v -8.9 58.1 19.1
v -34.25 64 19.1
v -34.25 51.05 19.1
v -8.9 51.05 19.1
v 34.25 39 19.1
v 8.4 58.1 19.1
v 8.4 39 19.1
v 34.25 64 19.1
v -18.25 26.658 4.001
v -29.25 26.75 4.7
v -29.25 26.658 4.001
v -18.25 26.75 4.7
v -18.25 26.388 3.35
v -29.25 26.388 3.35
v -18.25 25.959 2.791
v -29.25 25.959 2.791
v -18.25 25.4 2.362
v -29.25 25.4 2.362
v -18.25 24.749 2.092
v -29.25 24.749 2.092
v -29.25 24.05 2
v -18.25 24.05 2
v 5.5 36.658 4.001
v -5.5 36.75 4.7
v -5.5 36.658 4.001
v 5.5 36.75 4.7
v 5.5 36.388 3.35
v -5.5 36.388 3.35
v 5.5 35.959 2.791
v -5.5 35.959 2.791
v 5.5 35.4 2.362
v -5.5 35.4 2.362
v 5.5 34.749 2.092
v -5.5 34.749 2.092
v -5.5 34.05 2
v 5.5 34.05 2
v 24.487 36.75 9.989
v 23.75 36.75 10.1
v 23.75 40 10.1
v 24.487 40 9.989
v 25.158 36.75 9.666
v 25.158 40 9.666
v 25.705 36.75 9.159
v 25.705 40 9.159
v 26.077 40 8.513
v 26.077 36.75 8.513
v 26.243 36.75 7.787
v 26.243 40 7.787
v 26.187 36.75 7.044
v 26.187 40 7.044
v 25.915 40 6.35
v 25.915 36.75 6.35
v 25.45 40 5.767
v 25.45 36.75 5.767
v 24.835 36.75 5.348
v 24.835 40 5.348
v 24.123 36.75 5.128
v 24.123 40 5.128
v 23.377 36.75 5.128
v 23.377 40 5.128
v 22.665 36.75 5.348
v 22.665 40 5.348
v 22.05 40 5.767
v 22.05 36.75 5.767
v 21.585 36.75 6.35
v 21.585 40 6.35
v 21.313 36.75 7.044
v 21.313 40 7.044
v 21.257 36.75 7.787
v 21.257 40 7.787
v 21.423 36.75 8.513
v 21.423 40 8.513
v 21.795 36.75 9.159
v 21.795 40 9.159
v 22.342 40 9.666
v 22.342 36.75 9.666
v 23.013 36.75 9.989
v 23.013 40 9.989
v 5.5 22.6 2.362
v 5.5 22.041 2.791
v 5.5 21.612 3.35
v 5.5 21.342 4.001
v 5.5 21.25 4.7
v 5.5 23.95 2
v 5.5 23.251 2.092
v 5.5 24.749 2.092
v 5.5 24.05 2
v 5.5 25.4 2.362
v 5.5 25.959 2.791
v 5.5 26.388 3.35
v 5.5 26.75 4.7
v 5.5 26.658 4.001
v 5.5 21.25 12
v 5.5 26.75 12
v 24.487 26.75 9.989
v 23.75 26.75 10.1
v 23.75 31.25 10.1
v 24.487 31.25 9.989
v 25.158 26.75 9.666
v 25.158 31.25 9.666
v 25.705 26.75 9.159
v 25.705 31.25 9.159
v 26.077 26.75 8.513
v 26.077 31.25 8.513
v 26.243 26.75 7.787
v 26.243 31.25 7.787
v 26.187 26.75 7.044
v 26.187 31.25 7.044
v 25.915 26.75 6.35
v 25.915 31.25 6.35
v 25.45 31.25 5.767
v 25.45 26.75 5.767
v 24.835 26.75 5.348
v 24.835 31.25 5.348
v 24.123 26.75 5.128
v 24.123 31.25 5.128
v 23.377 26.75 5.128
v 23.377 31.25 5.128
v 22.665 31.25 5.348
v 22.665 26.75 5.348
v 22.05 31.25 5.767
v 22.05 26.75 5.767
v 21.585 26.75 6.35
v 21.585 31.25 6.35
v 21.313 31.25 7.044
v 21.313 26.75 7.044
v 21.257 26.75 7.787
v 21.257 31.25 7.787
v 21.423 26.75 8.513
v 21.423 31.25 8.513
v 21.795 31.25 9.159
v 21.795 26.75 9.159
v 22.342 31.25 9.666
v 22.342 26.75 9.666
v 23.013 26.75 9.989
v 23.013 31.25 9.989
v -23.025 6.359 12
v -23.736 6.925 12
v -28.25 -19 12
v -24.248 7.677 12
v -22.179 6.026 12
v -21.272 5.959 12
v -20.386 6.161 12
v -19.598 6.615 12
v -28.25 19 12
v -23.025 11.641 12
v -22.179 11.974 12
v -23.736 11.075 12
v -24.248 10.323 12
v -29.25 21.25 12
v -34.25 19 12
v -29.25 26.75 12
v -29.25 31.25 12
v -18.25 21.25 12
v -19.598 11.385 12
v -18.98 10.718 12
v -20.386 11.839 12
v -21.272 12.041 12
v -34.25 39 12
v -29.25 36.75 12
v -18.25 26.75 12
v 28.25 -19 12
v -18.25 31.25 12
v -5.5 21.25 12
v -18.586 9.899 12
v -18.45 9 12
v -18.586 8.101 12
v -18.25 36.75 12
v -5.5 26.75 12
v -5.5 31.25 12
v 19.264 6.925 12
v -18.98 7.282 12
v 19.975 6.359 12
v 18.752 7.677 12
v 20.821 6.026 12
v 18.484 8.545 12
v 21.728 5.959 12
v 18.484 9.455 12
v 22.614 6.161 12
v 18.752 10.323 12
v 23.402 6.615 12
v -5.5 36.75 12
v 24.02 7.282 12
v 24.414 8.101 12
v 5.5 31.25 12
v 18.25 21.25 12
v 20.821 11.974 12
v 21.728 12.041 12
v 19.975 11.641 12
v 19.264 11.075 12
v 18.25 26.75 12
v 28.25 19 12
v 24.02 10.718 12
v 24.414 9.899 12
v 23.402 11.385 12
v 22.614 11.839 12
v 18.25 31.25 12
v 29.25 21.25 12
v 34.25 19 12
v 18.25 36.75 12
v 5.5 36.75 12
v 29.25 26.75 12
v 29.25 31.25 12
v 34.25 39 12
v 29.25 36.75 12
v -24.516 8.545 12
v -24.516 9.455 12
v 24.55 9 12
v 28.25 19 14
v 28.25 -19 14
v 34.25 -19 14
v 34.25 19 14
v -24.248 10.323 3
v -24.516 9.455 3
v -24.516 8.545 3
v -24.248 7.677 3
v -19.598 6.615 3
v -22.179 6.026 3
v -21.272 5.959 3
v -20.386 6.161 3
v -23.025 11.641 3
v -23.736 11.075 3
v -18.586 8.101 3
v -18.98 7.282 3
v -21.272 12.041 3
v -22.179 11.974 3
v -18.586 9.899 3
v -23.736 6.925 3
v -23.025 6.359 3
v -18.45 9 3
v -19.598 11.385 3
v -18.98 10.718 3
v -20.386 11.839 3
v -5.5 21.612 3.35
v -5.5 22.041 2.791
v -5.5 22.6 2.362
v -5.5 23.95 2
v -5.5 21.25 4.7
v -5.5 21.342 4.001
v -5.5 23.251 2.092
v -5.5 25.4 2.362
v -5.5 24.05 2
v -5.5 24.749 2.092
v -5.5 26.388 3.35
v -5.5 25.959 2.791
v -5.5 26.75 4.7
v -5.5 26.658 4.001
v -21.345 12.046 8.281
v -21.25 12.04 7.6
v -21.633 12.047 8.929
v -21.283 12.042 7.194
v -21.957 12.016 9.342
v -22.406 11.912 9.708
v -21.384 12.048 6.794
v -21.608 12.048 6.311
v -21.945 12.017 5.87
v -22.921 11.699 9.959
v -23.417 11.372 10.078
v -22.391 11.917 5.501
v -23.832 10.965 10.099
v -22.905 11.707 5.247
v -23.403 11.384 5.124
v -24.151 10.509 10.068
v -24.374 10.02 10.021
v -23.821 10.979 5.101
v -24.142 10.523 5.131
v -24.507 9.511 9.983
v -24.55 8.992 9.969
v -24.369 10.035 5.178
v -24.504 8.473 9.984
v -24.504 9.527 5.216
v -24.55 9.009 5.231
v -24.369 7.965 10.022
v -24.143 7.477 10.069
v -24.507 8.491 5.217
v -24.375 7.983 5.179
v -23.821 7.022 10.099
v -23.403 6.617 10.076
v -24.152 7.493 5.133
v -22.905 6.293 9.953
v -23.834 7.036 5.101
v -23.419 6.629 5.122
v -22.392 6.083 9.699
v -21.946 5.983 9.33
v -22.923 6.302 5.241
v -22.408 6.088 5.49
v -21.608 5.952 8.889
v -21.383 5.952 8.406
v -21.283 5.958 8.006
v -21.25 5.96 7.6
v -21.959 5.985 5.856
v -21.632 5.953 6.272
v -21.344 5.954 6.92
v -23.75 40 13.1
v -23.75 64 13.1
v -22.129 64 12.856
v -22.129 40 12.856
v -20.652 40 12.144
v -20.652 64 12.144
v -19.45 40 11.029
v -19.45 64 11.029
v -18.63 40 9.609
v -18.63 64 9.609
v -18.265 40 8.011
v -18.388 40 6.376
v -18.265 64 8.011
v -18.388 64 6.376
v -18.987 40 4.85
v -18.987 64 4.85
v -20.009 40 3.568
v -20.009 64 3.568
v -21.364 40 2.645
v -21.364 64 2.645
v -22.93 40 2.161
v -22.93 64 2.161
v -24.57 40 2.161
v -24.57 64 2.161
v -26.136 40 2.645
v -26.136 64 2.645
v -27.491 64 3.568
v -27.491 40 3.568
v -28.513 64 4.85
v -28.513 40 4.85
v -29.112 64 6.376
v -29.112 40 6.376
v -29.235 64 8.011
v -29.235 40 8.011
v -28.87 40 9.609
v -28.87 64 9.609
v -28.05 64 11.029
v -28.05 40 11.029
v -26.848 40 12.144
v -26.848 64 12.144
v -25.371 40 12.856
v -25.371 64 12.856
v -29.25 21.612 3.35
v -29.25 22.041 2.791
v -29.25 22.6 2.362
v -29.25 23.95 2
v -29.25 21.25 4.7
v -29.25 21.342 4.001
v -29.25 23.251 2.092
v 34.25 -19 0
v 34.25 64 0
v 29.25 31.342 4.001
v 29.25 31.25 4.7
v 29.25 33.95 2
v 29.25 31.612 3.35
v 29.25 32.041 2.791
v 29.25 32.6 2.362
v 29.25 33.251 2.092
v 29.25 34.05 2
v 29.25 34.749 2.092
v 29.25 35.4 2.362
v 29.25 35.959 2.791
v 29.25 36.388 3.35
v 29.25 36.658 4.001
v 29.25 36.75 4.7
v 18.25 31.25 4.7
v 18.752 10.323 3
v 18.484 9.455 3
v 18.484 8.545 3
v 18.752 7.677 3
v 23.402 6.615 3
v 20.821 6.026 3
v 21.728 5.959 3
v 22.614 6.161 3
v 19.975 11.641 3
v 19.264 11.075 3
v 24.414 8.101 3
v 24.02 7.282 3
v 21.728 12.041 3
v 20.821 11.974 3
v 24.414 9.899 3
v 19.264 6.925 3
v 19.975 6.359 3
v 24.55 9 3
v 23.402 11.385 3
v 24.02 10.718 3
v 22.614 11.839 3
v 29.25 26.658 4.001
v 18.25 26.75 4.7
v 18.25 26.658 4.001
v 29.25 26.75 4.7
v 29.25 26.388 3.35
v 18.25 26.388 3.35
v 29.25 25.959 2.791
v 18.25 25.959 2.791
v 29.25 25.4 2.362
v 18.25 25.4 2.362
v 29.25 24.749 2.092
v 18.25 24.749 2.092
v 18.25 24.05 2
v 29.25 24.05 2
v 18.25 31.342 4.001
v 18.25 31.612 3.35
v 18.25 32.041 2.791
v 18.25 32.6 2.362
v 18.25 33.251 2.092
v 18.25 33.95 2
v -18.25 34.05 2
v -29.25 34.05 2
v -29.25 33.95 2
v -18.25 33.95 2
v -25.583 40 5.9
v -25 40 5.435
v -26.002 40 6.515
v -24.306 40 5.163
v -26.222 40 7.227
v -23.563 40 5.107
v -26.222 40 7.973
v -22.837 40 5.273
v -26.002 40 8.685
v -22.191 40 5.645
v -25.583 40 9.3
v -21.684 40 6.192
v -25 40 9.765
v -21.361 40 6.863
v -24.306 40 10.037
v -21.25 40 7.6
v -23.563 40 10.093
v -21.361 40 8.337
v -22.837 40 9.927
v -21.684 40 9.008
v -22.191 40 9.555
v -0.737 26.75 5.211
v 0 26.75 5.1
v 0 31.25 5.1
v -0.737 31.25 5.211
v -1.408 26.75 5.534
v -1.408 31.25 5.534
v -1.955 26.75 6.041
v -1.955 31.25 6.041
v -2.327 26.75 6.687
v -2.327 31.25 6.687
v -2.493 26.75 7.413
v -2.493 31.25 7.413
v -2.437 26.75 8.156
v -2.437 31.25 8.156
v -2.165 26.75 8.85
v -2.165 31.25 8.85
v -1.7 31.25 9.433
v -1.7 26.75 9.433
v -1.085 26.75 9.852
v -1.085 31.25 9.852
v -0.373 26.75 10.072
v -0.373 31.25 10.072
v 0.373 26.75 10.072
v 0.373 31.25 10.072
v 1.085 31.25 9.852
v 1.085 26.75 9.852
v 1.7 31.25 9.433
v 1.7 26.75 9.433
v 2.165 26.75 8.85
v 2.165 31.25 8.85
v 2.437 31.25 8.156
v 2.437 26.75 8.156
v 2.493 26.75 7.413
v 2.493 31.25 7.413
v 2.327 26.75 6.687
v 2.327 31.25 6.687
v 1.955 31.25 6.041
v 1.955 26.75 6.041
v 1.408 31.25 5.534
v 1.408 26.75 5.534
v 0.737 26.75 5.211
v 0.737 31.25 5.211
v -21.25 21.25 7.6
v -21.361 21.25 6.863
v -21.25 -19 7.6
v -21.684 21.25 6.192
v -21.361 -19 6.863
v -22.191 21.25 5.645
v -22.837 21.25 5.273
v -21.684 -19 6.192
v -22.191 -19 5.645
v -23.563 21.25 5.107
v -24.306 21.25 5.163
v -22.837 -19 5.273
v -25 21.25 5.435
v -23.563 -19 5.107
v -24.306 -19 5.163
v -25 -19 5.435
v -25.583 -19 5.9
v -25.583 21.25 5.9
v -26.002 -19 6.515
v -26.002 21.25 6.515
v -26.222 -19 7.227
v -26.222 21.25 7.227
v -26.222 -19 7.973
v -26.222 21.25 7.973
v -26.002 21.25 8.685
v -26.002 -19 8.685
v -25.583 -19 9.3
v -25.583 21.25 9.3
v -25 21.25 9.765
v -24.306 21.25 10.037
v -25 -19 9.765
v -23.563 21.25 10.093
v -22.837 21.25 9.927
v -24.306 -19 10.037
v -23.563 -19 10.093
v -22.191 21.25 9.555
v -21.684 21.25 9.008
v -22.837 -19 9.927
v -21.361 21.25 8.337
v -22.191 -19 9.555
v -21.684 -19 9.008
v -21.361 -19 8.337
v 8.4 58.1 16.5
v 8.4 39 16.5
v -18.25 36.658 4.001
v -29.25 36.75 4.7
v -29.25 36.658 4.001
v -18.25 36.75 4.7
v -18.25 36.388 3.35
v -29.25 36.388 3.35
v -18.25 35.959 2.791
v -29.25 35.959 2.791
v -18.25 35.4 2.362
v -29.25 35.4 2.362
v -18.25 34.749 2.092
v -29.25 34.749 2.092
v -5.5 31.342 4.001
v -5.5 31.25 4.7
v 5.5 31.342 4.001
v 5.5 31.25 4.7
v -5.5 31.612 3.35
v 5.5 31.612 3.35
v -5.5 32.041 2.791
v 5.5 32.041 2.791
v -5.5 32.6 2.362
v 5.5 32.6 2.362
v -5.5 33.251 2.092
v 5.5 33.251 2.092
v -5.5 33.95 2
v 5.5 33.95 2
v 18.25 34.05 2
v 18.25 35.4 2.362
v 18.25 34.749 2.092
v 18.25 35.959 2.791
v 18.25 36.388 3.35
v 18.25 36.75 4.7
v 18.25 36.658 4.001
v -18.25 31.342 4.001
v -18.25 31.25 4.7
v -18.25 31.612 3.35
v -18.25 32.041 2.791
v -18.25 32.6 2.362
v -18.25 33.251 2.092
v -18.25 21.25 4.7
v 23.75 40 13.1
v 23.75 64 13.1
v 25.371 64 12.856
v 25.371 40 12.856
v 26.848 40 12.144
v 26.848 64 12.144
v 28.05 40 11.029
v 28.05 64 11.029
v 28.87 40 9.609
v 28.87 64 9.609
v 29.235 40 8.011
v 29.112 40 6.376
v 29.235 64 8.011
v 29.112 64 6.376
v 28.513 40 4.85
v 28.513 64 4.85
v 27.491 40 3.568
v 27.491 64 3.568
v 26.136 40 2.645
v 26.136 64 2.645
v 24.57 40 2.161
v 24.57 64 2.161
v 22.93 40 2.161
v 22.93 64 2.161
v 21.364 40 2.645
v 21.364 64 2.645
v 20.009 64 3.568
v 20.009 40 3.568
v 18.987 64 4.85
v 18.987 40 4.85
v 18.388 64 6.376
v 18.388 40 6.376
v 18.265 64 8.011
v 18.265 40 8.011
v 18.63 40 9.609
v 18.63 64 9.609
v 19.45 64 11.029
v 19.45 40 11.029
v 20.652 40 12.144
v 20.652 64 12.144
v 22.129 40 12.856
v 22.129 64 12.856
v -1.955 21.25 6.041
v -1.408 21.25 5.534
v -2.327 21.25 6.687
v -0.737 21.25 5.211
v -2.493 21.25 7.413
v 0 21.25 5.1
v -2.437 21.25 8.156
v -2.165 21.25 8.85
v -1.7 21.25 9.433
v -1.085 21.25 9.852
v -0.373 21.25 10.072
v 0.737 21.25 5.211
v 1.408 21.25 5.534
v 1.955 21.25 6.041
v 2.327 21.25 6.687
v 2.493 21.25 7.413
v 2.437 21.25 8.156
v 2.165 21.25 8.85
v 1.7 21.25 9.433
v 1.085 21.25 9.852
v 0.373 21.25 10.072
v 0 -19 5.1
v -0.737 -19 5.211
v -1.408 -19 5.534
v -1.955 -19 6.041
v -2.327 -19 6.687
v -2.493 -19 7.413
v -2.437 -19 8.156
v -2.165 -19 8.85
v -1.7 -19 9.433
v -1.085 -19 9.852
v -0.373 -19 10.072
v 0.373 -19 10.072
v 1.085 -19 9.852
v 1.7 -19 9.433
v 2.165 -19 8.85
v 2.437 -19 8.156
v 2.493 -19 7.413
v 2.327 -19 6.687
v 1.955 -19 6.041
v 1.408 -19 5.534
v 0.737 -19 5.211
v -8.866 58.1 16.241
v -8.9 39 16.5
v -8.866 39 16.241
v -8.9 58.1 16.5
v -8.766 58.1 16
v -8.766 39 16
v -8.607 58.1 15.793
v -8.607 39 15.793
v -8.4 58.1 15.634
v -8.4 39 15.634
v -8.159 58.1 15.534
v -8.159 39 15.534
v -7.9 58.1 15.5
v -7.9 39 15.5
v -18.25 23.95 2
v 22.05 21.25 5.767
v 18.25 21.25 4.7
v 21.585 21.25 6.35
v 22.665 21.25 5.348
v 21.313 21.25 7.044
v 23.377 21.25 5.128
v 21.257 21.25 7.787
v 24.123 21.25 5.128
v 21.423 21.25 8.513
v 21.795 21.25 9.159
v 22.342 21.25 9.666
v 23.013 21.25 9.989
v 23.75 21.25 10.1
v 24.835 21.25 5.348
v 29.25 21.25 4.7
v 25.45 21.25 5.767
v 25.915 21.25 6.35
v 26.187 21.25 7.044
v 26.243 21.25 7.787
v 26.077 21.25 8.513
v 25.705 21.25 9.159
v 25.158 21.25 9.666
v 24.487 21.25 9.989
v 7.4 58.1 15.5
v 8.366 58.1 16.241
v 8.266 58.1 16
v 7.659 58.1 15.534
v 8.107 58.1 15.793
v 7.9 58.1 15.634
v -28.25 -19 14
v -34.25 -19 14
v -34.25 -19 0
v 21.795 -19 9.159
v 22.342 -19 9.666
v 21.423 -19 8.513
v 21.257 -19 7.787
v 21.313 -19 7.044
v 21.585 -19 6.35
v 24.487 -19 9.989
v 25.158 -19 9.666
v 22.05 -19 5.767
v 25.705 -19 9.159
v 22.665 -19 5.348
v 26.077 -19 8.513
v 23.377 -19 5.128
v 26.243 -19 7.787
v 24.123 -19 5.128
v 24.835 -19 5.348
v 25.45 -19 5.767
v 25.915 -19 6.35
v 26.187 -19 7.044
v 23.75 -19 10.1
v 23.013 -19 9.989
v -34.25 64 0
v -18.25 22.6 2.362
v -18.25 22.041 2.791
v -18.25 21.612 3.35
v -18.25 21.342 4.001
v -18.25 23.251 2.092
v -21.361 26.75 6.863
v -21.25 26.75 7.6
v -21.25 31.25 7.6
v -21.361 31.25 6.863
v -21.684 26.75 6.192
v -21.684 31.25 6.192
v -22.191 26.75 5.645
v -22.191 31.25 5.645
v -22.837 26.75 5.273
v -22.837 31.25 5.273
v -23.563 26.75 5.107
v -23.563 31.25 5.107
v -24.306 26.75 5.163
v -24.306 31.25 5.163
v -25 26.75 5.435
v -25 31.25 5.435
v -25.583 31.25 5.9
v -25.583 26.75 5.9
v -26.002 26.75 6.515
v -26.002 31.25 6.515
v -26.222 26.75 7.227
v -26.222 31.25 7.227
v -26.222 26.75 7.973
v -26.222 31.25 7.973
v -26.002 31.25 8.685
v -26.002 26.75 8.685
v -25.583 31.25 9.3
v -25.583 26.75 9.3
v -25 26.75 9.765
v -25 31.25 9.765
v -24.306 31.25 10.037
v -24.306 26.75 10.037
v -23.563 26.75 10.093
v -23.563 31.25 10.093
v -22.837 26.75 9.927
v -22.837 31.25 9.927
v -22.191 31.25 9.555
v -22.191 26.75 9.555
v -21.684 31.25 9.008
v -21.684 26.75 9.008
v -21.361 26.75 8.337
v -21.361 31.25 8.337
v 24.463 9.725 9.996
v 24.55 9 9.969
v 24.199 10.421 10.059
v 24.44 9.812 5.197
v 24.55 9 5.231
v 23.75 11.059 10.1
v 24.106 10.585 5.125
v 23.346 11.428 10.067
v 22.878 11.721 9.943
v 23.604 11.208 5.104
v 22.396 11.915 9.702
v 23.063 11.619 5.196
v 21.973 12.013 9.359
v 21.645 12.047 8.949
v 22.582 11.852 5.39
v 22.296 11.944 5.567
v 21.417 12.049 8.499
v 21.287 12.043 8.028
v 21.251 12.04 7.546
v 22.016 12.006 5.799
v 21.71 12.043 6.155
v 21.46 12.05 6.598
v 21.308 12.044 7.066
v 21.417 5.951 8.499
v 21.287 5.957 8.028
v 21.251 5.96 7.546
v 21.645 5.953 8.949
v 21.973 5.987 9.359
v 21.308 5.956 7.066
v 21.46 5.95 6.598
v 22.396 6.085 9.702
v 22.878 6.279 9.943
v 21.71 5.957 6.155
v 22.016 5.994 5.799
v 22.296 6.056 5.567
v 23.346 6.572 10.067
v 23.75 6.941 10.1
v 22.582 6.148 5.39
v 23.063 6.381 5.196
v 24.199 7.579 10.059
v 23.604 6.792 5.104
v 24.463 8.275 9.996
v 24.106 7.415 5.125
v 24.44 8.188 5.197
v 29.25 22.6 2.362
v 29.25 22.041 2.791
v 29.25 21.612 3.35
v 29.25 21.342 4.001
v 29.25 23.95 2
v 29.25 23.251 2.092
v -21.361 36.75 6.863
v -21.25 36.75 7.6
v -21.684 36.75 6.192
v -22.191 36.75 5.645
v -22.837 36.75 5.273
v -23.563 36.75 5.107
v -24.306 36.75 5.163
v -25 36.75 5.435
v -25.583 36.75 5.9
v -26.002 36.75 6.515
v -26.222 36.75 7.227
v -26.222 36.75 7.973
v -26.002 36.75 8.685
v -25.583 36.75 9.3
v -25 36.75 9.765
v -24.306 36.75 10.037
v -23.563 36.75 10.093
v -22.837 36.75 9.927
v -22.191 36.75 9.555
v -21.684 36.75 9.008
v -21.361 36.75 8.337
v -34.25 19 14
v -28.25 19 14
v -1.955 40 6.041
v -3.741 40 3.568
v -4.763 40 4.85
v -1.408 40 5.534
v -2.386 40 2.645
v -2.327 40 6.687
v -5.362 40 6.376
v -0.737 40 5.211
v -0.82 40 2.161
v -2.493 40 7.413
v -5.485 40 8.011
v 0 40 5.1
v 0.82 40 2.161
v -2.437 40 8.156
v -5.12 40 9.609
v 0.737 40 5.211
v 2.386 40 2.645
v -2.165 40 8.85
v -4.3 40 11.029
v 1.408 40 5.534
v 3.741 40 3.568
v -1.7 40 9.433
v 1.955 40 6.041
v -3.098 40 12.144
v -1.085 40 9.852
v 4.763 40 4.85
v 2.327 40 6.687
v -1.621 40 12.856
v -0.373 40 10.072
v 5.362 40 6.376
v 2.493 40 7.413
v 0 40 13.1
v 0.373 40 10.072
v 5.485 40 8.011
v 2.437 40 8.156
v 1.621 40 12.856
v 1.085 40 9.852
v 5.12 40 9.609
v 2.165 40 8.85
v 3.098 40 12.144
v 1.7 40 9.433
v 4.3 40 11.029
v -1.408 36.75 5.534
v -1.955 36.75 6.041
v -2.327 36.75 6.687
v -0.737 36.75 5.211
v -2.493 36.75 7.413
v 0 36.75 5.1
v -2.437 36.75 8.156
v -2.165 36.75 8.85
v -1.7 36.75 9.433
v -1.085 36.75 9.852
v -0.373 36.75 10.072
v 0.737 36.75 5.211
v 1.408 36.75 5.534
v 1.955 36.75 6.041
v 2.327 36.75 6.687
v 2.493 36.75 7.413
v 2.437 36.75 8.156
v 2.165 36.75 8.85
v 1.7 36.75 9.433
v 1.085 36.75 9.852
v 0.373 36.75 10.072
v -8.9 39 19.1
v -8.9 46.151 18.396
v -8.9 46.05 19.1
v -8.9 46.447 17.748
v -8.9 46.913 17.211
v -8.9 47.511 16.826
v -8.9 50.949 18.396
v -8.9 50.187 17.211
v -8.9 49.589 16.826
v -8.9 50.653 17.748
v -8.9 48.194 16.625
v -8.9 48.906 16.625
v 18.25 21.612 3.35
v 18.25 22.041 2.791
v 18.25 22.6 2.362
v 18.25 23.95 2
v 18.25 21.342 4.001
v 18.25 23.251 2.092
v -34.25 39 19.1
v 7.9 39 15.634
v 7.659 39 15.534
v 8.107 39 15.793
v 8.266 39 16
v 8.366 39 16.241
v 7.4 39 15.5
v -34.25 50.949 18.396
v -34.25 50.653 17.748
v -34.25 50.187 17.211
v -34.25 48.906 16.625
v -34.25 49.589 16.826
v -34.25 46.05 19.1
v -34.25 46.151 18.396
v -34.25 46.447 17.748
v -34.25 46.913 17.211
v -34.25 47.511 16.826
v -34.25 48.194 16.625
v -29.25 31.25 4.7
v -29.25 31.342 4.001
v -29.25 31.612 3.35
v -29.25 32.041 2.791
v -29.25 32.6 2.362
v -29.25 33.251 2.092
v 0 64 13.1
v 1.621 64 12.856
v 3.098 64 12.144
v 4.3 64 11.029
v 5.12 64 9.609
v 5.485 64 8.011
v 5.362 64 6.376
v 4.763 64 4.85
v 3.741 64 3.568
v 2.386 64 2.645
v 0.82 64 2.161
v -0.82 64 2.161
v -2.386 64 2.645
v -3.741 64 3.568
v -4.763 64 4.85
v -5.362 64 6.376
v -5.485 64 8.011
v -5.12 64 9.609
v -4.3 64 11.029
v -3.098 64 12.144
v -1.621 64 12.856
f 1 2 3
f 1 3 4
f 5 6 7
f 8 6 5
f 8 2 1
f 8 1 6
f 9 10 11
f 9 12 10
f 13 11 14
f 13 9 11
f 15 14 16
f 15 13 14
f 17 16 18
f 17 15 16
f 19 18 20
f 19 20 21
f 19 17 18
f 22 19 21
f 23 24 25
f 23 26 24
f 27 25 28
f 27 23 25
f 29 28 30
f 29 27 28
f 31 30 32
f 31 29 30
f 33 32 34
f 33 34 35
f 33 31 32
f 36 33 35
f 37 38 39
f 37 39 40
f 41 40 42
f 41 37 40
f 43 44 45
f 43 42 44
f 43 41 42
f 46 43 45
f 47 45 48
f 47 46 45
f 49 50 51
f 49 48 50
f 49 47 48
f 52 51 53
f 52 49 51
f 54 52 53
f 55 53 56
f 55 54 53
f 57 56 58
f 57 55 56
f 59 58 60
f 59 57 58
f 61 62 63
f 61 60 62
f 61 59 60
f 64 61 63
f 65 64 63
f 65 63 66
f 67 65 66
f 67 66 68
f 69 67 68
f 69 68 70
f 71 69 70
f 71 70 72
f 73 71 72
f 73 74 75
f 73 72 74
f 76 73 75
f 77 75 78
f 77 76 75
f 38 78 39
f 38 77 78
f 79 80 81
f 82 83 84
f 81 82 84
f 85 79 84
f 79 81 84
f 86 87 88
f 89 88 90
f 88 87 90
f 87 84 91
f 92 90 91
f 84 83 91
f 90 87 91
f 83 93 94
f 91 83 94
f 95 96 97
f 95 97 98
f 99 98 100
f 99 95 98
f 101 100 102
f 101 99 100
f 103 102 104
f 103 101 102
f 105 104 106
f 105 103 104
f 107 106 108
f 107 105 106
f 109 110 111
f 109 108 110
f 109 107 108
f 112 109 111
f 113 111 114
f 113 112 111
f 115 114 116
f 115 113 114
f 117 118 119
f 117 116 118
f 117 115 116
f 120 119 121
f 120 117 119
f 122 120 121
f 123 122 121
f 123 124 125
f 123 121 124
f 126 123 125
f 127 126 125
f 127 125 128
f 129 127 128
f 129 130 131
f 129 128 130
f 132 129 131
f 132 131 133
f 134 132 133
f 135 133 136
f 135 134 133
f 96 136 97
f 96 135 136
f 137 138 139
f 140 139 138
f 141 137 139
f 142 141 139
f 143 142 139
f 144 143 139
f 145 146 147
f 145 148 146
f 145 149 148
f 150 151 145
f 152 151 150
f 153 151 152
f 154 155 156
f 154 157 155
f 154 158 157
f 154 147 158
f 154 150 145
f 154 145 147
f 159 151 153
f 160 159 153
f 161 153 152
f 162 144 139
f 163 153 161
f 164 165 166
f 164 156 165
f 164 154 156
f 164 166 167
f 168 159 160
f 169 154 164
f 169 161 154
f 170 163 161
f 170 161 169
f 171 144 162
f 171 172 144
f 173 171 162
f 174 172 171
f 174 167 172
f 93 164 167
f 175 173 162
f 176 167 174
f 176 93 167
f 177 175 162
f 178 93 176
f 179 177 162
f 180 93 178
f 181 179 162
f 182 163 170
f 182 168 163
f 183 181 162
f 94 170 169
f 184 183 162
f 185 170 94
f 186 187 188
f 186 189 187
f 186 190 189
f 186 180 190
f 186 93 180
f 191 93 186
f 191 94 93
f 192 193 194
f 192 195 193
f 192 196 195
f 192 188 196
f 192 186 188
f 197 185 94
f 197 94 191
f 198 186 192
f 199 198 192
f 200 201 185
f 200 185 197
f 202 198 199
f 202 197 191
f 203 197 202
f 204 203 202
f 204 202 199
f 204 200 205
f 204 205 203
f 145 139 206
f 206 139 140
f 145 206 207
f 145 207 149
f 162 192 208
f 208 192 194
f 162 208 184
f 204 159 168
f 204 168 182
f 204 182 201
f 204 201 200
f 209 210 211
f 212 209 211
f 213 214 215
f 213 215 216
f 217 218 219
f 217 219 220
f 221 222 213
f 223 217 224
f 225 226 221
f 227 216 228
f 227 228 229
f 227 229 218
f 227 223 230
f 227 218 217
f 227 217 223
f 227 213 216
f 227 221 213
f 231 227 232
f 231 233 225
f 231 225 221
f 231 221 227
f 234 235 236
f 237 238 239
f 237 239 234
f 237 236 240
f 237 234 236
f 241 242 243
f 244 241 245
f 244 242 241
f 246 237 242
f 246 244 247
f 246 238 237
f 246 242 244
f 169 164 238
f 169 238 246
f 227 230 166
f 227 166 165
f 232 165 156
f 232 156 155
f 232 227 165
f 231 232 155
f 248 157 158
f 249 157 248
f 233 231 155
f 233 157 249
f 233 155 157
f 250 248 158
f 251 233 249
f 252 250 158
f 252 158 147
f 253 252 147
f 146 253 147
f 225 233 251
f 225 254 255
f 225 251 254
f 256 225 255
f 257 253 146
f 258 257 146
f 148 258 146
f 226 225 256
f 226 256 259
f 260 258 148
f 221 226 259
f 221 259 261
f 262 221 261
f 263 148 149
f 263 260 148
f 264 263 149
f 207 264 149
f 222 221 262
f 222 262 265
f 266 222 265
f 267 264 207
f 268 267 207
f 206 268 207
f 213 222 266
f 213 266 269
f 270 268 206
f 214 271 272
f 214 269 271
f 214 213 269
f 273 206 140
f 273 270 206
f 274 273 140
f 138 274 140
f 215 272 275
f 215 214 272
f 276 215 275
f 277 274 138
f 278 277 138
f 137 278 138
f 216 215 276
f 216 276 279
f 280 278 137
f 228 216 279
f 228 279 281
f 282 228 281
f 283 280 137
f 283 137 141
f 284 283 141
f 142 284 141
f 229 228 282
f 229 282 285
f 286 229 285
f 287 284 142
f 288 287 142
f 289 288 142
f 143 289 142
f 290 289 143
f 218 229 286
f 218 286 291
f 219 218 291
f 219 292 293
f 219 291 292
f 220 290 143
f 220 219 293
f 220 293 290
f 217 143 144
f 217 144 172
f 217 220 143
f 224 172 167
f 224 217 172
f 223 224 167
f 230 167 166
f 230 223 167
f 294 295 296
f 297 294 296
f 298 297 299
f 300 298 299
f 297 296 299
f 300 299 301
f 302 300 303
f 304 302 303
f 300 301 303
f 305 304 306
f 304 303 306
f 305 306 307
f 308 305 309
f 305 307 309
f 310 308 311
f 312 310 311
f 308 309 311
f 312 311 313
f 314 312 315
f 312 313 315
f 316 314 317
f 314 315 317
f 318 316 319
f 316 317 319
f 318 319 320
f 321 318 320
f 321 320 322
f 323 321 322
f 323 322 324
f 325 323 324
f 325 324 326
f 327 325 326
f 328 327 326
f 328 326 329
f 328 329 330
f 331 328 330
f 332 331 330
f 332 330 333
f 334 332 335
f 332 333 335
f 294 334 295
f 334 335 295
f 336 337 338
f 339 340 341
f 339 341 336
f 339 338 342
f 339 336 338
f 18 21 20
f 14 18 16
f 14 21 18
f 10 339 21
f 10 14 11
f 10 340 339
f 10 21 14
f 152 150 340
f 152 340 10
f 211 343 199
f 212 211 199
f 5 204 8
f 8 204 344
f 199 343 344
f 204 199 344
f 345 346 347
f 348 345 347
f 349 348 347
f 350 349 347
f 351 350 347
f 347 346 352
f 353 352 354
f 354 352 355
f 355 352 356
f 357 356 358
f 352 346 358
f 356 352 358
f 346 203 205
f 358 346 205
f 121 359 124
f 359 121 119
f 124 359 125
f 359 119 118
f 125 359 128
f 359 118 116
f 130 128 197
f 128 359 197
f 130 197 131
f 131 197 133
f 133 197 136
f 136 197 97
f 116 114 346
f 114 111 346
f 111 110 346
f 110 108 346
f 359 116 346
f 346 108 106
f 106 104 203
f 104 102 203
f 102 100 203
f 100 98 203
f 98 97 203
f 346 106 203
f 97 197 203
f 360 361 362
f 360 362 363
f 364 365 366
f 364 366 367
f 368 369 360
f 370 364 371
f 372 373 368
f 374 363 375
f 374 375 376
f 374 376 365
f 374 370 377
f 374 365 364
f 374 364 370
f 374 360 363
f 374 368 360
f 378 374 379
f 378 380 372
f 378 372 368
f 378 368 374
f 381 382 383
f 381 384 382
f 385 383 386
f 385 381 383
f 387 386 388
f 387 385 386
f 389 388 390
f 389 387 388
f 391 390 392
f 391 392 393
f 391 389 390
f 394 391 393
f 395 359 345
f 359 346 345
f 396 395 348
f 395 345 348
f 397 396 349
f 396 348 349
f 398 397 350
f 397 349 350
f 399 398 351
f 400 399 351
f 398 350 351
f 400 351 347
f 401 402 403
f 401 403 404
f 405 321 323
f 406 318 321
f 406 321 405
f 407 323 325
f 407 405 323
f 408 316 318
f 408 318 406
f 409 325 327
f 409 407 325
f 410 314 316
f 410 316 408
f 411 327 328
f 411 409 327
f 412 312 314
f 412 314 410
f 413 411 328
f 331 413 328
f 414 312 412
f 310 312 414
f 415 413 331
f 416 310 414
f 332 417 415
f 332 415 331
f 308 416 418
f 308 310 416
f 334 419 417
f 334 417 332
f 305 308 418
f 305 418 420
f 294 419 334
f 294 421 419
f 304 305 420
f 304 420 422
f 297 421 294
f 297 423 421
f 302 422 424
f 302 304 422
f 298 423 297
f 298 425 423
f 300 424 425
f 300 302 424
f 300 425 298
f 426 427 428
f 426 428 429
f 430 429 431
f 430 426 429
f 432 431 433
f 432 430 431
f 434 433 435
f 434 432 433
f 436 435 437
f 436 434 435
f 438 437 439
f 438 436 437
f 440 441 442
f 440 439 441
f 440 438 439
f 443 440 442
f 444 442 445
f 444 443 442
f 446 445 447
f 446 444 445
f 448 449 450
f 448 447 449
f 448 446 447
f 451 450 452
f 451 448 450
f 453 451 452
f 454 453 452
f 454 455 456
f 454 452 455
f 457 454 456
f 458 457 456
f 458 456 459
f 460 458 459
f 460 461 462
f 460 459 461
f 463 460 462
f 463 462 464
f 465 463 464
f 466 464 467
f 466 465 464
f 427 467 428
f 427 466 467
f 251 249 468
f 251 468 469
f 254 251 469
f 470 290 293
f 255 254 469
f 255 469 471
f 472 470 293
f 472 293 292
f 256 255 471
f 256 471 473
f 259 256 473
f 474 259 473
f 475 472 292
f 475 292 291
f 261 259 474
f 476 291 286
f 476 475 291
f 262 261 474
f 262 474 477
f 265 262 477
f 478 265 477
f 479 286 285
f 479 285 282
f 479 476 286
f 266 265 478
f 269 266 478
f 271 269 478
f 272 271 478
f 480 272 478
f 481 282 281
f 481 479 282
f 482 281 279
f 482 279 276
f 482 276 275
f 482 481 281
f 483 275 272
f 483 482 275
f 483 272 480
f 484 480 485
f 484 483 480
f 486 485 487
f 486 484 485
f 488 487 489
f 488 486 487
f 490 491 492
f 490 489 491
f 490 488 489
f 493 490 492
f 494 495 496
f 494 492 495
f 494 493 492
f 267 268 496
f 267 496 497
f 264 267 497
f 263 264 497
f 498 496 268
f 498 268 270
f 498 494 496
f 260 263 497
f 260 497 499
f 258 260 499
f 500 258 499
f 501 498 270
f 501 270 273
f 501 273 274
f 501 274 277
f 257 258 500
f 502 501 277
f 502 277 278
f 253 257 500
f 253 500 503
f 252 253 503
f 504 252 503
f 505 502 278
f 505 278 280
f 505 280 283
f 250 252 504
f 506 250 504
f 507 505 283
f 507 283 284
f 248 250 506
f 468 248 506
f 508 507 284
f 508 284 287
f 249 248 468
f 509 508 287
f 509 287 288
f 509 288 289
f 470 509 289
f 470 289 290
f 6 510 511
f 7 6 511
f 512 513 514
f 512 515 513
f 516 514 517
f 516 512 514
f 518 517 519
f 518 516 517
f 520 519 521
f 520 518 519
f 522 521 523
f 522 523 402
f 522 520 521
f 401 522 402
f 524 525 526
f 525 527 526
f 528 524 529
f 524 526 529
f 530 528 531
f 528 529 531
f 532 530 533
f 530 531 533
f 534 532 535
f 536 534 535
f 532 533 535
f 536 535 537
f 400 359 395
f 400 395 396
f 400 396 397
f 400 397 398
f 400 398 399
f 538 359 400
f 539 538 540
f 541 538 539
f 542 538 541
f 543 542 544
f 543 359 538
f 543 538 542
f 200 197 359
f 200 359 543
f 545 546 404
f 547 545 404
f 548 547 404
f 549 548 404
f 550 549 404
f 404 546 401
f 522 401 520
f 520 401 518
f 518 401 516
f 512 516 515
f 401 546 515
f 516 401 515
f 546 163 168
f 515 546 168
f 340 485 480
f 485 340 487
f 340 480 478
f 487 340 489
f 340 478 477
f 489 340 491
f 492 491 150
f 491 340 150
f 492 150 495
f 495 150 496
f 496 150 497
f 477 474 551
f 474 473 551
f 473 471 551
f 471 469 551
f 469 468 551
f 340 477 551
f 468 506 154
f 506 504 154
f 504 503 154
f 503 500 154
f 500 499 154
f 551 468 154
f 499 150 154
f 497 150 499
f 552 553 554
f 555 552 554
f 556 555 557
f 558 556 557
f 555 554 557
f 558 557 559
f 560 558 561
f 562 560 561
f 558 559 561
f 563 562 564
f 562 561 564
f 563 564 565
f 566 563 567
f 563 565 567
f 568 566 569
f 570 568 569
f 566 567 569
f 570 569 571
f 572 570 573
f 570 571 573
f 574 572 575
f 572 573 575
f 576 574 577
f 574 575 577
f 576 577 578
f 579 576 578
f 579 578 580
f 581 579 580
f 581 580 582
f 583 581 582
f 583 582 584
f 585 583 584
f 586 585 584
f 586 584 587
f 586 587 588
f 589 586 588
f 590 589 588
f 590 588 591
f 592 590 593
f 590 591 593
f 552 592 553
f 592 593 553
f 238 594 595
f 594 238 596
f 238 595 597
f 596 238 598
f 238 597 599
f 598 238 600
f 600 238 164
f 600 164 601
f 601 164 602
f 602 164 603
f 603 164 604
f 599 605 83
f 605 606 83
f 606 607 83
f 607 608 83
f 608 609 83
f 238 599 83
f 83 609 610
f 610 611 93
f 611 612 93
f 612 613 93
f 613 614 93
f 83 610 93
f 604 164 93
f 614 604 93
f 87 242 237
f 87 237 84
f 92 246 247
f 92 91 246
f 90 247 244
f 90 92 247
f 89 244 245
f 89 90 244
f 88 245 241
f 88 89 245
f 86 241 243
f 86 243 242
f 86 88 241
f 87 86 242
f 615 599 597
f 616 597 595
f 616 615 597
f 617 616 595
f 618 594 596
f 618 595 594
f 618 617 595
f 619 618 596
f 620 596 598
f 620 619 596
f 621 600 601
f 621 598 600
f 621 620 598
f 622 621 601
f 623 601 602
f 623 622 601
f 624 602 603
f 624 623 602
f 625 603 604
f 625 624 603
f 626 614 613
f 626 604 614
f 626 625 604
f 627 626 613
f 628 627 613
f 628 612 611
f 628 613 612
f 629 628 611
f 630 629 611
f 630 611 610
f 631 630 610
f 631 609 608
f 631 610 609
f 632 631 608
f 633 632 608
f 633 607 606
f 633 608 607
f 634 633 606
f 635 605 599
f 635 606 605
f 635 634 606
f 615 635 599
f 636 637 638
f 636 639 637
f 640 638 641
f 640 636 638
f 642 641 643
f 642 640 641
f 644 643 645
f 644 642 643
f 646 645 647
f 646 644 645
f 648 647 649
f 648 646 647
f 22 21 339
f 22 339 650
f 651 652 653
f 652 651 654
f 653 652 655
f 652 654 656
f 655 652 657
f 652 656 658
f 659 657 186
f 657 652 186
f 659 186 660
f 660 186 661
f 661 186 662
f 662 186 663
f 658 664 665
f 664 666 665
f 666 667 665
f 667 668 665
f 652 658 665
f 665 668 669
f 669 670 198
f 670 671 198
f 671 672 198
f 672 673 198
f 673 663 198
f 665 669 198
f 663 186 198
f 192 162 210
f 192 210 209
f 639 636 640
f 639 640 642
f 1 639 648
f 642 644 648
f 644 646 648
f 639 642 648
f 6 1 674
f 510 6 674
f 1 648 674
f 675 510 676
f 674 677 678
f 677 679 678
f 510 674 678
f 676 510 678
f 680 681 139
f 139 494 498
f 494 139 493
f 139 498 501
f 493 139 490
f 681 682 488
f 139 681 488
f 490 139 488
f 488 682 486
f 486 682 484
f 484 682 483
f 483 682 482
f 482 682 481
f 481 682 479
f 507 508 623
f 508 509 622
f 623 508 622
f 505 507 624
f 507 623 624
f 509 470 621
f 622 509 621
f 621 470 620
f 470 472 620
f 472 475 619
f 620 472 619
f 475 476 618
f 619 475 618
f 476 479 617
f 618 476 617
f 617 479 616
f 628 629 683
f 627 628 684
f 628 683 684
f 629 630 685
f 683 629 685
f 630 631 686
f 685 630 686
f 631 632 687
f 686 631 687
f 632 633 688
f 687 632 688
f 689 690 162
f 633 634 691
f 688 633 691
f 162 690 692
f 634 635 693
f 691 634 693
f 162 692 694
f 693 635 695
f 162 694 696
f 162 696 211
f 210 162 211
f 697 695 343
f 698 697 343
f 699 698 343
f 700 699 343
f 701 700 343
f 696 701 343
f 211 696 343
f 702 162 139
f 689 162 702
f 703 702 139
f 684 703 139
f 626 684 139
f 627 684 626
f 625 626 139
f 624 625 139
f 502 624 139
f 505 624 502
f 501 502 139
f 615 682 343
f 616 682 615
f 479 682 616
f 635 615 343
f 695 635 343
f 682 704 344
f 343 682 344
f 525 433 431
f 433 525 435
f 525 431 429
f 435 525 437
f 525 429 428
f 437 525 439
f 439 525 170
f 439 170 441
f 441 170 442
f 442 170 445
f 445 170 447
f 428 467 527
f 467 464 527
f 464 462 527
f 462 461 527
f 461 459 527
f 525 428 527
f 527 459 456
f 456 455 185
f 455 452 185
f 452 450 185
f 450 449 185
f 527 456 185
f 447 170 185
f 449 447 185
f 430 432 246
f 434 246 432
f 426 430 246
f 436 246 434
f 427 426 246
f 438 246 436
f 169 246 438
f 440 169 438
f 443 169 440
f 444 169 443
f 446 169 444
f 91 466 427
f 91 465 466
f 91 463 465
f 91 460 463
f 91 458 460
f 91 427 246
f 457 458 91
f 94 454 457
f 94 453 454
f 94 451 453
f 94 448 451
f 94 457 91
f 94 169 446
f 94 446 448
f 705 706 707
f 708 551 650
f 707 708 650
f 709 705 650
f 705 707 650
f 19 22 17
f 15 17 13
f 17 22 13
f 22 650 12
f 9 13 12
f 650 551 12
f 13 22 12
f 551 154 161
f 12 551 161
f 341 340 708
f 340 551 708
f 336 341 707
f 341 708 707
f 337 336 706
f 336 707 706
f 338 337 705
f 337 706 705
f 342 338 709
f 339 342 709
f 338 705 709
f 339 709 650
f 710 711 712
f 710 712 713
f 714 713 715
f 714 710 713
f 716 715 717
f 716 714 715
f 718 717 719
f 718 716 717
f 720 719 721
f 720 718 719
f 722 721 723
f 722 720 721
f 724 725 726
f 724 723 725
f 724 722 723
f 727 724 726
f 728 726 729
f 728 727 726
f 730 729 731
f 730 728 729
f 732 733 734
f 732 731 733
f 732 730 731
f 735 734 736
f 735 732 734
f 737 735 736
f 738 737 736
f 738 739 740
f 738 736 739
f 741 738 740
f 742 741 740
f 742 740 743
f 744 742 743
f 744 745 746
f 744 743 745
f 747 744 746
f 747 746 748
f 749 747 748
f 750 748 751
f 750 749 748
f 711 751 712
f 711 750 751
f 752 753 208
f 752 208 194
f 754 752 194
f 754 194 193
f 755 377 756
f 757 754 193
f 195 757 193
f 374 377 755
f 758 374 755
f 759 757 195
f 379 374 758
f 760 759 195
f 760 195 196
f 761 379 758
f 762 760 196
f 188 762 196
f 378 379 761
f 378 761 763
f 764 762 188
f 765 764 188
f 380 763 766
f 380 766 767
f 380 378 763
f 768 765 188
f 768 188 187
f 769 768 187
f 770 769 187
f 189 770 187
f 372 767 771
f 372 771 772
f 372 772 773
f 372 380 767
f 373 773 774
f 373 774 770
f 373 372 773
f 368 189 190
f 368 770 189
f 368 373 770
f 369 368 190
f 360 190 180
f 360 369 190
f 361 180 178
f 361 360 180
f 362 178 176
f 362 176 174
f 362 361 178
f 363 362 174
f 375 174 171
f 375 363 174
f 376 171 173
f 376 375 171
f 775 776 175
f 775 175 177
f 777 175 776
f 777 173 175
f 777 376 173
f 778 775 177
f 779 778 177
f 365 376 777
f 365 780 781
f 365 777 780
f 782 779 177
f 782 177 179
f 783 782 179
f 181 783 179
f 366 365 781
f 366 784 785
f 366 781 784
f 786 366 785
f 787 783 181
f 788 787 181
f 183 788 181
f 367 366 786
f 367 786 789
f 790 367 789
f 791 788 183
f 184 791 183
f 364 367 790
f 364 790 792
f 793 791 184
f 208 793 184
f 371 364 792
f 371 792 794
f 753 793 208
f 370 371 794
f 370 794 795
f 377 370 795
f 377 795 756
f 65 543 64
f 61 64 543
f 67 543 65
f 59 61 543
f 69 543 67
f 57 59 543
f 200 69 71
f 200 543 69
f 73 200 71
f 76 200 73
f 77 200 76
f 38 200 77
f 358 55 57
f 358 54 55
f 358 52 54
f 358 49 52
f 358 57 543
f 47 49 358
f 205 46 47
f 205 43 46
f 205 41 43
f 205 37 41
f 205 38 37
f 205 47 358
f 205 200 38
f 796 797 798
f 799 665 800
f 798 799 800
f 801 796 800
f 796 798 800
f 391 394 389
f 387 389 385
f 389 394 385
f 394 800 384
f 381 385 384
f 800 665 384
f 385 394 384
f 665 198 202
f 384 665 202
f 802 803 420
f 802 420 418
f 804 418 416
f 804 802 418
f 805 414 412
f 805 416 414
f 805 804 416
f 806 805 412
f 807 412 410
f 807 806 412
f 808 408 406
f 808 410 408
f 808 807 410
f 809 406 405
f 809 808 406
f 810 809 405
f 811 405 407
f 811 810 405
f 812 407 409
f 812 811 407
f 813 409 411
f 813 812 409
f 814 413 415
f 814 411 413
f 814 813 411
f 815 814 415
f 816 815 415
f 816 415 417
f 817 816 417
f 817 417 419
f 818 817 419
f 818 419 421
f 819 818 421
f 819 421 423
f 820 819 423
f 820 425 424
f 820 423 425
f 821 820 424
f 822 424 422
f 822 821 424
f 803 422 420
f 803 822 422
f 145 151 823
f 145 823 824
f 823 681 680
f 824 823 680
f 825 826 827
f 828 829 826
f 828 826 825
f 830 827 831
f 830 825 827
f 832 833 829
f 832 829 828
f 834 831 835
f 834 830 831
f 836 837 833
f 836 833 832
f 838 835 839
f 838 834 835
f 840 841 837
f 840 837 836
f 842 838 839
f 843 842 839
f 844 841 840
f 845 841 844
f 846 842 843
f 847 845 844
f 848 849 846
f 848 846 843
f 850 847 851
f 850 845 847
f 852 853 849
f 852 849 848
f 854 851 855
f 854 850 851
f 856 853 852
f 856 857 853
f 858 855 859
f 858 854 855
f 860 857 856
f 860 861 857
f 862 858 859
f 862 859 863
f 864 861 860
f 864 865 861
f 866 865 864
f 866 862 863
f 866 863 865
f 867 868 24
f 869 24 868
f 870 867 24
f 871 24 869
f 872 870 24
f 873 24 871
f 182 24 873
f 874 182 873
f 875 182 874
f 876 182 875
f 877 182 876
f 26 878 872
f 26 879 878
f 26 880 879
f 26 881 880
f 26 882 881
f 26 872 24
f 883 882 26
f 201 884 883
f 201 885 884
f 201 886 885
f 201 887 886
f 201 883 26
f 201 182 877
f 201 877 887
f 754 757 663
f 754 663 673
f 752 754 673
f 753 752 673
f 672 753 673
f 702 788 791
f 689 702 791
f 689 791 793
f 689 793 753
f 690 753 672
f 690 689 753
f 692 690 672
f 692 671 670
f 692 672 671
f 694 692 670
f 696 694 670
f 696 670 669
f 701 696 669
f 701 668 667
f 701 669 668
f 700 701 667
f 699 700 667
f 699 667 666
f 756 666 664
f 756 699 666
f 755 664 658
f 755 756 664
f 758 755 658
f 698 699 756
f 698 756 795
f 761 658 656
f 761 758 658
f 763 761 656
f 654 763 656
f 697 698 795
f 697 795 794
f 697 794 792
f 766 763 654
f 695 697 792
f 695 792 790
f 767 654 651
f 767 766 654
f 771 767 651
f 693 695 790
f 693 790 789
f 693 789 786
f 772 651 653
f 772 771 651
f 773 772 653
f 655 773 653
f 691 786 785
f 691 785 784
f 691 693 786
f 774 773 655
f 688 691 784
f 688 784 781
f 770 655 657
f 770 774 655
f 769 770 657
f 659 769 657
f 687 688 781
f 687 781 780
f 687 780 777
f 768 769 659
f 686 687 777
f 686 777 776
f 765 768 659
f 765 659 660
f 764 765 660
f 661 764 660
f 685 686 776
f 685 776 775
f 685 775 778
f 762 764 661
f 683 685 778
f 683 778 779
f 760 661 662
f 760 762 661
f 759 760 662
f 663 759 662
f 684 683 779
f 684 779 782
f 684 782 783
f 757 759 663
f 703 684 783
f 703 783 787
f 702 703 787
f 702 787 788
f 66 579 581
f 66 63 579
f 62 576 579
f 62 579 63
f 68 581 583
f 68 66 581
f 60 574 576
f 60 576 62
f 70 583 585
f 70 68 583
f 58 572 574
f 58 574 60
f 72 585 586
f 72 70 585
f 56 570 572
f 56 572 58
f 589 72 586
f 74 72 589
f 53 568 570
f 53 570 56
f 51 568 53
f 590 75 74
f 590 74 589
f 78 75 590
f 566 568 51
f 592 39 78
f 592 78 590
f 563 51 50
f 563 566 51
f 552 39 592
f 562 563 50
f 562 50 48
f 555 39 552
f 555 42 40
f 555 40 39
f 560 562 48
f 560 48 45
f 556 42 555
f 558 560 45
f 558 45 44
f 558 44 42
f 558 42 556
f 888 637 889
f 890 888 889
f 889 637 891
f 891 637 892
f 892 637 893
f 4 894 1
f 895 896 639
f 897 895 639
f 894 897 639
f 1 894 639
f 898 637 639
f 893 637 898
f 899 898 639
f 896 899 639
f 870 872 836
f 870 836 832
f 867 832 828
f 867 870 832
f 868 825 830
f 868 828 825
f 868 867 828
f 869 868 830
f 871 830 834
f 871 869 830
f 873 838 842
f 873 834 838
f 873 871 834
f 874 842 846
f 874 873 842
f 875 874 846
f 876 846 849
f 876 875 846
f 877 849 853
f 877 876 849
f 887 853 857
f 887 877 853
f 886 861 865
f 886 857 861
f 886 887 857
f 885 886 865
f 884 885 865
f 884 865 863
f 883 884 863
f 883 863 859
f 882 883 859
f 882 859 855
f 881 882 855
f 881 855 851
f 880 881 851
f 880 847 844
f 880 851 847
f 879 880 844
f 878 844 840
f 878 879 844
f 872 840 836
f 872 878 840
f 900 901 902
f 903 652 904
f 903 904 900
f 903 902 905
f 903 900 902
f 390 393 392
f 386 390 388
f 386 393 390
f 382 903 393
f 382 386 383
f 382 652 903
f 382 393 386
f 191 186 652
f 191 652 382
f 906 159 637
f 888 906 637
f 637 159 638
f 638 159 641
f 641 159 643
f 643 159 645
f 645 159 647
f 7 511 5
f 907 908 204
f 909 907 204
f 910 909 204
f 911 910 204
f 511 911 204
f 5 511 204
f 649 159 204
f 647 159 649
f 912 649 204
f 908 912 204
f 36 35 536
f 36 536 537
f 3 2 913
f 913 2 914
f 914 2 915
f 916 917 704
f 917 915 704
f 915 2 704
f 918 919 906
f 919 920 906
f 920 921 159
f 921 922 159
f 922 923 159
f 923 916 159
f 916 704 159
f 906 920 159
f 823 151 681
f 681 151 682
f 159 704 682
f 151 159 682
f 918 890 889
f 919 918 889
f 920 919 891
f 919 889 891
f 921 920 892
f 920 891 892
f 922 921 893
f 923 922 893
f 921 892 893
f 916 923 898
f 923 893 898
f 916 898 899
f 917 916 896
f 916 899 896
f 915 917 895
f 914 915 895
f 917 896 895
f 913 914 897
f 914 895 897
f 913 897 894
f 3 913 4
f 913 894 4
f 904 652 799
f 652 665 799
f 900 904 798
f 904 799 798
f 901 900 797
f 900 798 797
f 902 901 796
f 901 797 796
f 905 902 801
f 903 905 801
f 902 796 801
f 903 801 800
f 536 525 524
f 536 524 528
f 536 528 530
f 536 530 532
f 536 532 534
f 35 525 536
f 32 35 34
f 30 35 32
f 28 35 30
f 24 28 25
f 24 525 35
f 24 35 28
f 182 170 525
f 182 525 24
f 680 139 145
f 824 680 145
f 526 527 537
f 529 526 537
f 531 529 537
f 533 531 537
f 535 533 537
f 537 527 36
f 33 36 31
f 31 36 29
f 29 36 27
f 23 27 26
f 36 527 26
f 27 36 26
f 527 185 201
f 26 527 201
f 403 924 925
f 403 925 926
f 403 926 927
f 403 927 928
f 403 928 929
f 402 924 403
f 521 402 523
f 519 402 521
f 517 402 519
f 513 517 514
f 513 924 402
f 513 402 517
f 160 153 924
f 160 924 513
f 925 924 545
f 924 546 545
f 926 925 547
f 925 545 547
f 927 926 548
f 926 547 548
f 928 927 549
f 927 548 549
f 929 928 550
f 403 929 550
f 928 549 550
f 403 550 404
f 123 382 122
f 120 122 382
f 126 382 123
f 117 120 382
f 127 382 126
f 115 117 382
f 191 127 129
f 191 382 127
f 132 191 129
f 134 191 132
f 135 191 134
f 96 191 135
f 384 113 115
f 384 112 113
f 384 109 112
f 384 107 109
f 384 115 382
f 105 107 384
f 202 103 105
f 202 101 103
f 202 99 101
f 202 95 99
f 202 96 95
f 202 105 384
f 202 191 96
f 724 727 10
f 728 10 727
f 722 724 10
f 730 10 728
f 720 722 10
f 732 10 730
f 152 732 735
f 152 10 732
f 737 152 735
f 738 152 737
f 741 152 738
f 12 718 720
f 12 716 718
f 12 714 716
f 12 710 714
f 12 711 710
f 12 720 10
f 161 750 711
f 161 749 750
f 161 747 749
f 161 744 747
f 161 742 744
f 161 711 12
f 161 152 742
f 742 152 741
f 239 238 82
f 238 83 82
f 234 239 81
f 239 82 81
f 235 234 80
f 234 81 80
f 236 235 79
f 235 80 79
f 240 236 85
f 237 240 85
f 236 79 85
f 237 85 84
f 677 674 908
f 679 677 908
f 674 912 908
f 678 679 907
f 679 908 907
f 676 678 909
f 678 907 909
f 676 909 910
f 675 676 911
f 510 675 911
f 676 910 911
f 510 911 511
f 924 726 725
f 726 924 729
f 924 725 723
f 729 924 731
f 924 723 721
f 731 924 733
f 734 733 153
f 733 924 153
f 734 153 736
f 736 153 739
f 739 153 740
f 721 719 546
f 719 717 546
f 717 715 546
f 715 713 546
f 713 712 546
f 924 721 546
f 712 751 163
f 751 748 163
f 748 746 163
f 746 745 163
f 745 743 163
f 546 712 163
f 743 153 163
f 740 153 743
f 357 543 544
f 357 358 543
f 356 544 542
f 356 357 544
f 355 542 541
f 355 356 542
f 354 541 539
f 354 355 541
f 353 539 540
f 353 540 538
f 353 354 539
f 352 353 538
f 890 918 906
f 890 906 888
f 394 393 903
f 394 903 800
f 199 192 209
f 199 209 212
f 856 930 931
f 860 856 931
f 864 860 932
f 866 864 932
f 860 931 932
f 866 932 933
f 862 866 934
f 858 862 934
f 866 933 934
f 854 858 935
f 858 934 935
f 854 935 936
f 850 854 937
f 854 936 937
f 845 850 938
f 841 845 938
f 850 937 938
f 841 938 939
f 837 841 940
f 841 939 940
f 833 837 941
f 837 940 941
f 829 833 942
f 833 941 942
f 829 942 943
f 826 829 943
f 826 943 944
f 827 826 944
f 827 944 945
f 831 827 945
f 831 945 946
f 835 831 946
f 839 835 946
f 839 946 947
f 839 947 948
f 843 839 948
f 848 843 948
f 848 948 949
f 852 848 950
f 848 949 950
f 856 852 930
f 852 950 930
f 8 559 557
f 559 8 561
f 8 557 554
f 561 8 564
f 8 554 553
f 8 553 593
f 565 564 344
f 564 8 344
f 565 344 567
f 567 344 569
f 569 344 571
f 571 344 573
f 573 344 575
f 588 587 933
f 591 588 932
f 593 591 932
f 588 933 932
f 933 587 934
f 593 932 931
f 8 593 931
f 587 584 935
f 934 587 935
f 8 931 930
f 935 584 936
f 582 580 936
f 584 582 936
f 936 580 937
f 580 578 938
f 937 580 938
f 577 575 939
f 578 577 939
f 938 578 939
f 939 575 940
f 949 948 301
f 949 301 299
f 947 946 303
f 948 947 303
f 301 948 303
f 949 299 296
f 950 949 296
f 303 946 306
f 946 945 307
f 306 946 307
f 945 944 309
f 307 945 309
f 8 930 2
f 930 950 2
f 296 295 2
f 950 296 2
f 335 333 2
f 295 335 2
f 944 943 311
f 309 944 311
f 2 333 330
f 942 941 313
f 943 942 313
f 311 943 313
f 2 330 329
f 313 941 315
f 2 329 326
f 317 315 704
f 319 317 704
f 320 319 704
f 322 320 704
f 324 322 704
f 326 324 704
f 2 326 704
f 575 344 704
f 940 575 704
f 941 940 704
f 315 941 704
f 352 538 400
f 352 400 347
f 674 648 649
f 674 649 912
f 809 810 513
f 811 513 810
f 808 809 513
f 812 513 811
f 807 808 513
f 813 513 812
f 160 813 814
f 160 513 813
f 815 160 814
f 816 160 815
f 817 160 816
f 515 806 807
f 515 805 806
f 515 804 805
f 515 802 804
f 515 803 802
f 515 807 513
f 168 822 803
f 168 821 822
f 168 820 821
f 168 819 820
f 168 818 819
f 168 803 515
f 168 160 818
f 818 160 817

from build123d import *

# Parameters (mm, degrees)
ESQUISSE2_W                  = 56.5
ESQUISSE2_H                  = 38
ESQUISSE2_R                  = 3.05
ESQUISSE2_W_2                = 6
SOCLESYRINGE_DEPTH           = 12
ESQUISSE2_2_R                = 3.05
BOSS_EXTRU_2_DEPTH           = 3
ESQUISSE2_4_W                = 6
ESQUISSE2_4_H                = 38
BOSS_EXTRU_4_DEPTH           = 14
ESQUISSE3_W                  = 68.5
ESQUISSE3_H                  = 20
BOSS_EXTRU_3_DEPTH           = 12
ESQUISSE4_W                  = 11
ESQUISSE4_H                  = 5.5
ENL_V_MAT_EXTRU_1_DEPTH      = 10
CONG_1_R                     = 2.7
ESQUISSE6_W                  = 68.5
ESQUISSE6_H                  = 25
BOSS_EXTRU_5_DEPTH           = 15.5
BOSS_EXTRU_6_DEPTH           = 3.6
ENL_V_MAT_EXTRU_3_DEPTH      = 80.515611675
CONG_2_R                     = 1
ENL_V_MAT_EXTRU_2_DEPTH      = 76.059126694
ENL_V_MAT_EXTRU_2_DEPTH_BACK = 76.059126694
ESQUISSE5_R                  = 2.5
ESQUISSE9_R                  = 5.5
ENL_V_MAT_EXTRU_4_DEPTH      = 24


with BuildPart() as part:
    # Esquisse2 → SocleSyringe (new body)
    # profile 1 of 3: a face of its own
    with BuildSketch(Plane.XY):
        Rectangle(ESQUISSE2_W, ESQUISSE2_H)
        with Locations((-21.5, 9)):
            Circle(ESQUISSE2_R, mode=Mode.SUBTRACT)
        with Locations((21.5, 9)):
            Circle(ESQUISSE2_R, mode=Mode.SUBTRACT)
    # profile 2 of 3: a face of its own
    with BuildSketch(Plane.XY):
        with Locations((-31.25, 0)):
            Rectangle(ESQUISSE2_W_2, ESQUISSE2_H)
    # profile 3 of 3: a face of its own
    with BuildSketch(Plane.XY):
        with Locations((31.25, 0)):
            Rectangle(ESQUISSE2_W_2, ESQUISSE2_H)
    extrude(amount=SOCLESYRINGE_DEPTH)

    # Esquisse2<2> → Boss.-Extru.2 (add)
    with BuildSketch(Plane.XY):
        with Locations((-21.5, 9)):
            Circle(ESQUISSE2_2_R)
        with Locations((21.5, 9)):
            Circle(ESQUISSE2_2_R)
    extrude(amount=BOSS_EXTRU_2_DEPTH)

    # Esquisse2<4> → Boss.-Extru.4 (add)
    with BuildSketch(Plane.XY):
        with Locations((-31.25, 0)):
            Rectangle(ESQUISSE2_4_W, ESQUISSE2_4_H)
        with Locations((31.25, 0)):
            Rectangle(ESQUISSE2_4_W, ESQUISSE2_4_H)
    extrude(amount=BOSS_EXTRU_4_DEPTH)

    # Esquisse3 → Boss.-Extru.3 (add)
    with BuildSketch(Plane.XY):
        with Locations((0, 29)):
            Rectangle(ESQUISSE3_W, ESQUISSE3_H)
    extrude(amount=BOSS_EXTRU_3_DEPTH)

    # Esquisse4 → Enlèv. mat.-Extru.1 (cut)
    with BuildSketch(Plane.XY.offset(12)):
        with Locations((-23.75, 34)):
            Rectangle(ESQUISSE4_W, ESQUISSE4_H)
        with Locations((23.75, 34)):
            Rectangle(ESQUISSE4_W, ESQUISSE4_H)
        with Locations((23.75, 24)):
            Rectangle(ESQUISSE4_W, ESQUISSE4_H)
        with Locations((-23.75, 24)):
            Rectangle(ESQUISSE4_W, ESQUISSE4_H)
        with Locations((0, 34)):
            Rectangle(ESQUISSE4_W, ESQUISSE4_H)
        with Locations((0, 24)):
            Rectangle(ESQUISSE4_W, ESQUISSE4_H)
    extrude(amount=-ENL_V_MAT_EXTRU_1_DEPTH, mode=Mode.SUBTRACT)

    # Congé1
    cong_1_edges = [part.edges().sort_by_distance(p)[0] for p in [
        (23.75, 36.75, 2),
        (23.75, 31.25, 2),
        (23.75, 26.75, 2),
        (23.75, 21.25, 2),
        (-23.75, 21.25, 2),
        (-23.75, 26.75, 2),
        (0, 31.25, 2),
        (0, 36.75, 2),
        (0, 21.25, 2),
        (0, 26.75, 2),
        (-23.75, 31.25, 2),
        (-23.75, 36.75, 2),
    ]]
    fillet(cong_1_edges, radius=CONG_1_R)

    # Esquisse6 → Boss.-Extru.5 (add)
    with BuildSketch(Plane.XY):
        with Locations((0, 51.5)):
            Rectangle(ESQUISSE6_W, ESQUISSE6_H)
    extrude(amount=BOSS_EXTRU_5_DEPTH)

    # Esquisse7 → Boss.-Extru.6 (add)
    with BuildSketch(Plane.XY.offset(15.5)):
        Polygon((-34.25, 39), (-8.9, 39), (-8.9, 58.1), (0, 58.1), (0, 64), (-34.25, 64), align=None)
        Polygon((8.4, 58.1), (8.4, 39), (34.25, 39), (34.25, 64), (0, 64), (0, 58.1), align=None)
    extrude(amount=BOSS_EXTRU_6_DEPTH)

    # Esquisse8 → Enlèv. mat.-Extru.3 (cut, through all)
    with BuildSketch(Plane(origin=(-8.9, 0, 0), x_dir=(0, 0, -1), z_dir=(1, 0, 0))):
        with BuildLine():
            Line((-19.1, 51.05), (-19.1, 46.05))
            ThreePointArc((-19.1, 46.05), (-16.6, 48.55), (-19.1, 51.05))
        make_face()
    extrude(amount=-ENL_V_MAT_EXTRU_3_DEPTH, mode=Mode.SUBTRACT)

    # Congé2
    cong_2_edges = [part.edges().sort_by_distance(p)[0] for p in [
        (-8.9, 48.55, 15.5),
        (8.4, 48.55, 15.5),
    ]]
    fillet(cong_2_edges, radius=CONG_2_R)

    # Esquisse5 → Enlèv. mat.-Extru.2 (cut, two sides: drawn at the far end of the back side and taken through both)
    with BuildSketch(Plane(origin=(0, 0, 0), x_dir=(1, 0, 0), z_dir=(0, 1, 0)).offset(-ENL_V_MAT_EXTRU_2_DEPTH_BACK)):
        with Locations(Location((23.75, -7.6, 0), (0, 0, 270))):
            Circle(ESQUISSE5_R)
        with Locations((-23.75, -7.6)):
            Circle(ESQUISSE5_R)
        with Locations(Location((0, -7.6, 0), (0, 0, 90))):
            Circle(ESQUISSE5_R)
    extrude(amount=ENL_V_MAT_EXTRU_2_DEPTH + ENL_V_MAT_EXTRU_2_DEPTH_BACK, mode=Mode.SUBTRACT)

    # Esquisse9 → Enlèv. mat.-Extru.4 (cut)
    with BuildSketch(Plane(origin=(0, 64, 0), x_dir=(1, 0, 0), z_dir=(0, 1, 0))):
        with Locations(Location((-23.75, -7.6, 0), (0, 0, 270))):
            Circle(ESQUISSE9_R)
        with Locations(Location((0, -7.6, 0), (0, 0, 270))):
            Circle(ESQUISSE9_R)
        with Locations(Location((23.75, -7.6, 0), (0, 0, 270))):
            Circle(ESQUISSE9_R)
    extrude(amount=-ENL_V_MAT_EXTRU_4_DEPTH, mode=Mode.SUBTRACT)


solid = part.part
